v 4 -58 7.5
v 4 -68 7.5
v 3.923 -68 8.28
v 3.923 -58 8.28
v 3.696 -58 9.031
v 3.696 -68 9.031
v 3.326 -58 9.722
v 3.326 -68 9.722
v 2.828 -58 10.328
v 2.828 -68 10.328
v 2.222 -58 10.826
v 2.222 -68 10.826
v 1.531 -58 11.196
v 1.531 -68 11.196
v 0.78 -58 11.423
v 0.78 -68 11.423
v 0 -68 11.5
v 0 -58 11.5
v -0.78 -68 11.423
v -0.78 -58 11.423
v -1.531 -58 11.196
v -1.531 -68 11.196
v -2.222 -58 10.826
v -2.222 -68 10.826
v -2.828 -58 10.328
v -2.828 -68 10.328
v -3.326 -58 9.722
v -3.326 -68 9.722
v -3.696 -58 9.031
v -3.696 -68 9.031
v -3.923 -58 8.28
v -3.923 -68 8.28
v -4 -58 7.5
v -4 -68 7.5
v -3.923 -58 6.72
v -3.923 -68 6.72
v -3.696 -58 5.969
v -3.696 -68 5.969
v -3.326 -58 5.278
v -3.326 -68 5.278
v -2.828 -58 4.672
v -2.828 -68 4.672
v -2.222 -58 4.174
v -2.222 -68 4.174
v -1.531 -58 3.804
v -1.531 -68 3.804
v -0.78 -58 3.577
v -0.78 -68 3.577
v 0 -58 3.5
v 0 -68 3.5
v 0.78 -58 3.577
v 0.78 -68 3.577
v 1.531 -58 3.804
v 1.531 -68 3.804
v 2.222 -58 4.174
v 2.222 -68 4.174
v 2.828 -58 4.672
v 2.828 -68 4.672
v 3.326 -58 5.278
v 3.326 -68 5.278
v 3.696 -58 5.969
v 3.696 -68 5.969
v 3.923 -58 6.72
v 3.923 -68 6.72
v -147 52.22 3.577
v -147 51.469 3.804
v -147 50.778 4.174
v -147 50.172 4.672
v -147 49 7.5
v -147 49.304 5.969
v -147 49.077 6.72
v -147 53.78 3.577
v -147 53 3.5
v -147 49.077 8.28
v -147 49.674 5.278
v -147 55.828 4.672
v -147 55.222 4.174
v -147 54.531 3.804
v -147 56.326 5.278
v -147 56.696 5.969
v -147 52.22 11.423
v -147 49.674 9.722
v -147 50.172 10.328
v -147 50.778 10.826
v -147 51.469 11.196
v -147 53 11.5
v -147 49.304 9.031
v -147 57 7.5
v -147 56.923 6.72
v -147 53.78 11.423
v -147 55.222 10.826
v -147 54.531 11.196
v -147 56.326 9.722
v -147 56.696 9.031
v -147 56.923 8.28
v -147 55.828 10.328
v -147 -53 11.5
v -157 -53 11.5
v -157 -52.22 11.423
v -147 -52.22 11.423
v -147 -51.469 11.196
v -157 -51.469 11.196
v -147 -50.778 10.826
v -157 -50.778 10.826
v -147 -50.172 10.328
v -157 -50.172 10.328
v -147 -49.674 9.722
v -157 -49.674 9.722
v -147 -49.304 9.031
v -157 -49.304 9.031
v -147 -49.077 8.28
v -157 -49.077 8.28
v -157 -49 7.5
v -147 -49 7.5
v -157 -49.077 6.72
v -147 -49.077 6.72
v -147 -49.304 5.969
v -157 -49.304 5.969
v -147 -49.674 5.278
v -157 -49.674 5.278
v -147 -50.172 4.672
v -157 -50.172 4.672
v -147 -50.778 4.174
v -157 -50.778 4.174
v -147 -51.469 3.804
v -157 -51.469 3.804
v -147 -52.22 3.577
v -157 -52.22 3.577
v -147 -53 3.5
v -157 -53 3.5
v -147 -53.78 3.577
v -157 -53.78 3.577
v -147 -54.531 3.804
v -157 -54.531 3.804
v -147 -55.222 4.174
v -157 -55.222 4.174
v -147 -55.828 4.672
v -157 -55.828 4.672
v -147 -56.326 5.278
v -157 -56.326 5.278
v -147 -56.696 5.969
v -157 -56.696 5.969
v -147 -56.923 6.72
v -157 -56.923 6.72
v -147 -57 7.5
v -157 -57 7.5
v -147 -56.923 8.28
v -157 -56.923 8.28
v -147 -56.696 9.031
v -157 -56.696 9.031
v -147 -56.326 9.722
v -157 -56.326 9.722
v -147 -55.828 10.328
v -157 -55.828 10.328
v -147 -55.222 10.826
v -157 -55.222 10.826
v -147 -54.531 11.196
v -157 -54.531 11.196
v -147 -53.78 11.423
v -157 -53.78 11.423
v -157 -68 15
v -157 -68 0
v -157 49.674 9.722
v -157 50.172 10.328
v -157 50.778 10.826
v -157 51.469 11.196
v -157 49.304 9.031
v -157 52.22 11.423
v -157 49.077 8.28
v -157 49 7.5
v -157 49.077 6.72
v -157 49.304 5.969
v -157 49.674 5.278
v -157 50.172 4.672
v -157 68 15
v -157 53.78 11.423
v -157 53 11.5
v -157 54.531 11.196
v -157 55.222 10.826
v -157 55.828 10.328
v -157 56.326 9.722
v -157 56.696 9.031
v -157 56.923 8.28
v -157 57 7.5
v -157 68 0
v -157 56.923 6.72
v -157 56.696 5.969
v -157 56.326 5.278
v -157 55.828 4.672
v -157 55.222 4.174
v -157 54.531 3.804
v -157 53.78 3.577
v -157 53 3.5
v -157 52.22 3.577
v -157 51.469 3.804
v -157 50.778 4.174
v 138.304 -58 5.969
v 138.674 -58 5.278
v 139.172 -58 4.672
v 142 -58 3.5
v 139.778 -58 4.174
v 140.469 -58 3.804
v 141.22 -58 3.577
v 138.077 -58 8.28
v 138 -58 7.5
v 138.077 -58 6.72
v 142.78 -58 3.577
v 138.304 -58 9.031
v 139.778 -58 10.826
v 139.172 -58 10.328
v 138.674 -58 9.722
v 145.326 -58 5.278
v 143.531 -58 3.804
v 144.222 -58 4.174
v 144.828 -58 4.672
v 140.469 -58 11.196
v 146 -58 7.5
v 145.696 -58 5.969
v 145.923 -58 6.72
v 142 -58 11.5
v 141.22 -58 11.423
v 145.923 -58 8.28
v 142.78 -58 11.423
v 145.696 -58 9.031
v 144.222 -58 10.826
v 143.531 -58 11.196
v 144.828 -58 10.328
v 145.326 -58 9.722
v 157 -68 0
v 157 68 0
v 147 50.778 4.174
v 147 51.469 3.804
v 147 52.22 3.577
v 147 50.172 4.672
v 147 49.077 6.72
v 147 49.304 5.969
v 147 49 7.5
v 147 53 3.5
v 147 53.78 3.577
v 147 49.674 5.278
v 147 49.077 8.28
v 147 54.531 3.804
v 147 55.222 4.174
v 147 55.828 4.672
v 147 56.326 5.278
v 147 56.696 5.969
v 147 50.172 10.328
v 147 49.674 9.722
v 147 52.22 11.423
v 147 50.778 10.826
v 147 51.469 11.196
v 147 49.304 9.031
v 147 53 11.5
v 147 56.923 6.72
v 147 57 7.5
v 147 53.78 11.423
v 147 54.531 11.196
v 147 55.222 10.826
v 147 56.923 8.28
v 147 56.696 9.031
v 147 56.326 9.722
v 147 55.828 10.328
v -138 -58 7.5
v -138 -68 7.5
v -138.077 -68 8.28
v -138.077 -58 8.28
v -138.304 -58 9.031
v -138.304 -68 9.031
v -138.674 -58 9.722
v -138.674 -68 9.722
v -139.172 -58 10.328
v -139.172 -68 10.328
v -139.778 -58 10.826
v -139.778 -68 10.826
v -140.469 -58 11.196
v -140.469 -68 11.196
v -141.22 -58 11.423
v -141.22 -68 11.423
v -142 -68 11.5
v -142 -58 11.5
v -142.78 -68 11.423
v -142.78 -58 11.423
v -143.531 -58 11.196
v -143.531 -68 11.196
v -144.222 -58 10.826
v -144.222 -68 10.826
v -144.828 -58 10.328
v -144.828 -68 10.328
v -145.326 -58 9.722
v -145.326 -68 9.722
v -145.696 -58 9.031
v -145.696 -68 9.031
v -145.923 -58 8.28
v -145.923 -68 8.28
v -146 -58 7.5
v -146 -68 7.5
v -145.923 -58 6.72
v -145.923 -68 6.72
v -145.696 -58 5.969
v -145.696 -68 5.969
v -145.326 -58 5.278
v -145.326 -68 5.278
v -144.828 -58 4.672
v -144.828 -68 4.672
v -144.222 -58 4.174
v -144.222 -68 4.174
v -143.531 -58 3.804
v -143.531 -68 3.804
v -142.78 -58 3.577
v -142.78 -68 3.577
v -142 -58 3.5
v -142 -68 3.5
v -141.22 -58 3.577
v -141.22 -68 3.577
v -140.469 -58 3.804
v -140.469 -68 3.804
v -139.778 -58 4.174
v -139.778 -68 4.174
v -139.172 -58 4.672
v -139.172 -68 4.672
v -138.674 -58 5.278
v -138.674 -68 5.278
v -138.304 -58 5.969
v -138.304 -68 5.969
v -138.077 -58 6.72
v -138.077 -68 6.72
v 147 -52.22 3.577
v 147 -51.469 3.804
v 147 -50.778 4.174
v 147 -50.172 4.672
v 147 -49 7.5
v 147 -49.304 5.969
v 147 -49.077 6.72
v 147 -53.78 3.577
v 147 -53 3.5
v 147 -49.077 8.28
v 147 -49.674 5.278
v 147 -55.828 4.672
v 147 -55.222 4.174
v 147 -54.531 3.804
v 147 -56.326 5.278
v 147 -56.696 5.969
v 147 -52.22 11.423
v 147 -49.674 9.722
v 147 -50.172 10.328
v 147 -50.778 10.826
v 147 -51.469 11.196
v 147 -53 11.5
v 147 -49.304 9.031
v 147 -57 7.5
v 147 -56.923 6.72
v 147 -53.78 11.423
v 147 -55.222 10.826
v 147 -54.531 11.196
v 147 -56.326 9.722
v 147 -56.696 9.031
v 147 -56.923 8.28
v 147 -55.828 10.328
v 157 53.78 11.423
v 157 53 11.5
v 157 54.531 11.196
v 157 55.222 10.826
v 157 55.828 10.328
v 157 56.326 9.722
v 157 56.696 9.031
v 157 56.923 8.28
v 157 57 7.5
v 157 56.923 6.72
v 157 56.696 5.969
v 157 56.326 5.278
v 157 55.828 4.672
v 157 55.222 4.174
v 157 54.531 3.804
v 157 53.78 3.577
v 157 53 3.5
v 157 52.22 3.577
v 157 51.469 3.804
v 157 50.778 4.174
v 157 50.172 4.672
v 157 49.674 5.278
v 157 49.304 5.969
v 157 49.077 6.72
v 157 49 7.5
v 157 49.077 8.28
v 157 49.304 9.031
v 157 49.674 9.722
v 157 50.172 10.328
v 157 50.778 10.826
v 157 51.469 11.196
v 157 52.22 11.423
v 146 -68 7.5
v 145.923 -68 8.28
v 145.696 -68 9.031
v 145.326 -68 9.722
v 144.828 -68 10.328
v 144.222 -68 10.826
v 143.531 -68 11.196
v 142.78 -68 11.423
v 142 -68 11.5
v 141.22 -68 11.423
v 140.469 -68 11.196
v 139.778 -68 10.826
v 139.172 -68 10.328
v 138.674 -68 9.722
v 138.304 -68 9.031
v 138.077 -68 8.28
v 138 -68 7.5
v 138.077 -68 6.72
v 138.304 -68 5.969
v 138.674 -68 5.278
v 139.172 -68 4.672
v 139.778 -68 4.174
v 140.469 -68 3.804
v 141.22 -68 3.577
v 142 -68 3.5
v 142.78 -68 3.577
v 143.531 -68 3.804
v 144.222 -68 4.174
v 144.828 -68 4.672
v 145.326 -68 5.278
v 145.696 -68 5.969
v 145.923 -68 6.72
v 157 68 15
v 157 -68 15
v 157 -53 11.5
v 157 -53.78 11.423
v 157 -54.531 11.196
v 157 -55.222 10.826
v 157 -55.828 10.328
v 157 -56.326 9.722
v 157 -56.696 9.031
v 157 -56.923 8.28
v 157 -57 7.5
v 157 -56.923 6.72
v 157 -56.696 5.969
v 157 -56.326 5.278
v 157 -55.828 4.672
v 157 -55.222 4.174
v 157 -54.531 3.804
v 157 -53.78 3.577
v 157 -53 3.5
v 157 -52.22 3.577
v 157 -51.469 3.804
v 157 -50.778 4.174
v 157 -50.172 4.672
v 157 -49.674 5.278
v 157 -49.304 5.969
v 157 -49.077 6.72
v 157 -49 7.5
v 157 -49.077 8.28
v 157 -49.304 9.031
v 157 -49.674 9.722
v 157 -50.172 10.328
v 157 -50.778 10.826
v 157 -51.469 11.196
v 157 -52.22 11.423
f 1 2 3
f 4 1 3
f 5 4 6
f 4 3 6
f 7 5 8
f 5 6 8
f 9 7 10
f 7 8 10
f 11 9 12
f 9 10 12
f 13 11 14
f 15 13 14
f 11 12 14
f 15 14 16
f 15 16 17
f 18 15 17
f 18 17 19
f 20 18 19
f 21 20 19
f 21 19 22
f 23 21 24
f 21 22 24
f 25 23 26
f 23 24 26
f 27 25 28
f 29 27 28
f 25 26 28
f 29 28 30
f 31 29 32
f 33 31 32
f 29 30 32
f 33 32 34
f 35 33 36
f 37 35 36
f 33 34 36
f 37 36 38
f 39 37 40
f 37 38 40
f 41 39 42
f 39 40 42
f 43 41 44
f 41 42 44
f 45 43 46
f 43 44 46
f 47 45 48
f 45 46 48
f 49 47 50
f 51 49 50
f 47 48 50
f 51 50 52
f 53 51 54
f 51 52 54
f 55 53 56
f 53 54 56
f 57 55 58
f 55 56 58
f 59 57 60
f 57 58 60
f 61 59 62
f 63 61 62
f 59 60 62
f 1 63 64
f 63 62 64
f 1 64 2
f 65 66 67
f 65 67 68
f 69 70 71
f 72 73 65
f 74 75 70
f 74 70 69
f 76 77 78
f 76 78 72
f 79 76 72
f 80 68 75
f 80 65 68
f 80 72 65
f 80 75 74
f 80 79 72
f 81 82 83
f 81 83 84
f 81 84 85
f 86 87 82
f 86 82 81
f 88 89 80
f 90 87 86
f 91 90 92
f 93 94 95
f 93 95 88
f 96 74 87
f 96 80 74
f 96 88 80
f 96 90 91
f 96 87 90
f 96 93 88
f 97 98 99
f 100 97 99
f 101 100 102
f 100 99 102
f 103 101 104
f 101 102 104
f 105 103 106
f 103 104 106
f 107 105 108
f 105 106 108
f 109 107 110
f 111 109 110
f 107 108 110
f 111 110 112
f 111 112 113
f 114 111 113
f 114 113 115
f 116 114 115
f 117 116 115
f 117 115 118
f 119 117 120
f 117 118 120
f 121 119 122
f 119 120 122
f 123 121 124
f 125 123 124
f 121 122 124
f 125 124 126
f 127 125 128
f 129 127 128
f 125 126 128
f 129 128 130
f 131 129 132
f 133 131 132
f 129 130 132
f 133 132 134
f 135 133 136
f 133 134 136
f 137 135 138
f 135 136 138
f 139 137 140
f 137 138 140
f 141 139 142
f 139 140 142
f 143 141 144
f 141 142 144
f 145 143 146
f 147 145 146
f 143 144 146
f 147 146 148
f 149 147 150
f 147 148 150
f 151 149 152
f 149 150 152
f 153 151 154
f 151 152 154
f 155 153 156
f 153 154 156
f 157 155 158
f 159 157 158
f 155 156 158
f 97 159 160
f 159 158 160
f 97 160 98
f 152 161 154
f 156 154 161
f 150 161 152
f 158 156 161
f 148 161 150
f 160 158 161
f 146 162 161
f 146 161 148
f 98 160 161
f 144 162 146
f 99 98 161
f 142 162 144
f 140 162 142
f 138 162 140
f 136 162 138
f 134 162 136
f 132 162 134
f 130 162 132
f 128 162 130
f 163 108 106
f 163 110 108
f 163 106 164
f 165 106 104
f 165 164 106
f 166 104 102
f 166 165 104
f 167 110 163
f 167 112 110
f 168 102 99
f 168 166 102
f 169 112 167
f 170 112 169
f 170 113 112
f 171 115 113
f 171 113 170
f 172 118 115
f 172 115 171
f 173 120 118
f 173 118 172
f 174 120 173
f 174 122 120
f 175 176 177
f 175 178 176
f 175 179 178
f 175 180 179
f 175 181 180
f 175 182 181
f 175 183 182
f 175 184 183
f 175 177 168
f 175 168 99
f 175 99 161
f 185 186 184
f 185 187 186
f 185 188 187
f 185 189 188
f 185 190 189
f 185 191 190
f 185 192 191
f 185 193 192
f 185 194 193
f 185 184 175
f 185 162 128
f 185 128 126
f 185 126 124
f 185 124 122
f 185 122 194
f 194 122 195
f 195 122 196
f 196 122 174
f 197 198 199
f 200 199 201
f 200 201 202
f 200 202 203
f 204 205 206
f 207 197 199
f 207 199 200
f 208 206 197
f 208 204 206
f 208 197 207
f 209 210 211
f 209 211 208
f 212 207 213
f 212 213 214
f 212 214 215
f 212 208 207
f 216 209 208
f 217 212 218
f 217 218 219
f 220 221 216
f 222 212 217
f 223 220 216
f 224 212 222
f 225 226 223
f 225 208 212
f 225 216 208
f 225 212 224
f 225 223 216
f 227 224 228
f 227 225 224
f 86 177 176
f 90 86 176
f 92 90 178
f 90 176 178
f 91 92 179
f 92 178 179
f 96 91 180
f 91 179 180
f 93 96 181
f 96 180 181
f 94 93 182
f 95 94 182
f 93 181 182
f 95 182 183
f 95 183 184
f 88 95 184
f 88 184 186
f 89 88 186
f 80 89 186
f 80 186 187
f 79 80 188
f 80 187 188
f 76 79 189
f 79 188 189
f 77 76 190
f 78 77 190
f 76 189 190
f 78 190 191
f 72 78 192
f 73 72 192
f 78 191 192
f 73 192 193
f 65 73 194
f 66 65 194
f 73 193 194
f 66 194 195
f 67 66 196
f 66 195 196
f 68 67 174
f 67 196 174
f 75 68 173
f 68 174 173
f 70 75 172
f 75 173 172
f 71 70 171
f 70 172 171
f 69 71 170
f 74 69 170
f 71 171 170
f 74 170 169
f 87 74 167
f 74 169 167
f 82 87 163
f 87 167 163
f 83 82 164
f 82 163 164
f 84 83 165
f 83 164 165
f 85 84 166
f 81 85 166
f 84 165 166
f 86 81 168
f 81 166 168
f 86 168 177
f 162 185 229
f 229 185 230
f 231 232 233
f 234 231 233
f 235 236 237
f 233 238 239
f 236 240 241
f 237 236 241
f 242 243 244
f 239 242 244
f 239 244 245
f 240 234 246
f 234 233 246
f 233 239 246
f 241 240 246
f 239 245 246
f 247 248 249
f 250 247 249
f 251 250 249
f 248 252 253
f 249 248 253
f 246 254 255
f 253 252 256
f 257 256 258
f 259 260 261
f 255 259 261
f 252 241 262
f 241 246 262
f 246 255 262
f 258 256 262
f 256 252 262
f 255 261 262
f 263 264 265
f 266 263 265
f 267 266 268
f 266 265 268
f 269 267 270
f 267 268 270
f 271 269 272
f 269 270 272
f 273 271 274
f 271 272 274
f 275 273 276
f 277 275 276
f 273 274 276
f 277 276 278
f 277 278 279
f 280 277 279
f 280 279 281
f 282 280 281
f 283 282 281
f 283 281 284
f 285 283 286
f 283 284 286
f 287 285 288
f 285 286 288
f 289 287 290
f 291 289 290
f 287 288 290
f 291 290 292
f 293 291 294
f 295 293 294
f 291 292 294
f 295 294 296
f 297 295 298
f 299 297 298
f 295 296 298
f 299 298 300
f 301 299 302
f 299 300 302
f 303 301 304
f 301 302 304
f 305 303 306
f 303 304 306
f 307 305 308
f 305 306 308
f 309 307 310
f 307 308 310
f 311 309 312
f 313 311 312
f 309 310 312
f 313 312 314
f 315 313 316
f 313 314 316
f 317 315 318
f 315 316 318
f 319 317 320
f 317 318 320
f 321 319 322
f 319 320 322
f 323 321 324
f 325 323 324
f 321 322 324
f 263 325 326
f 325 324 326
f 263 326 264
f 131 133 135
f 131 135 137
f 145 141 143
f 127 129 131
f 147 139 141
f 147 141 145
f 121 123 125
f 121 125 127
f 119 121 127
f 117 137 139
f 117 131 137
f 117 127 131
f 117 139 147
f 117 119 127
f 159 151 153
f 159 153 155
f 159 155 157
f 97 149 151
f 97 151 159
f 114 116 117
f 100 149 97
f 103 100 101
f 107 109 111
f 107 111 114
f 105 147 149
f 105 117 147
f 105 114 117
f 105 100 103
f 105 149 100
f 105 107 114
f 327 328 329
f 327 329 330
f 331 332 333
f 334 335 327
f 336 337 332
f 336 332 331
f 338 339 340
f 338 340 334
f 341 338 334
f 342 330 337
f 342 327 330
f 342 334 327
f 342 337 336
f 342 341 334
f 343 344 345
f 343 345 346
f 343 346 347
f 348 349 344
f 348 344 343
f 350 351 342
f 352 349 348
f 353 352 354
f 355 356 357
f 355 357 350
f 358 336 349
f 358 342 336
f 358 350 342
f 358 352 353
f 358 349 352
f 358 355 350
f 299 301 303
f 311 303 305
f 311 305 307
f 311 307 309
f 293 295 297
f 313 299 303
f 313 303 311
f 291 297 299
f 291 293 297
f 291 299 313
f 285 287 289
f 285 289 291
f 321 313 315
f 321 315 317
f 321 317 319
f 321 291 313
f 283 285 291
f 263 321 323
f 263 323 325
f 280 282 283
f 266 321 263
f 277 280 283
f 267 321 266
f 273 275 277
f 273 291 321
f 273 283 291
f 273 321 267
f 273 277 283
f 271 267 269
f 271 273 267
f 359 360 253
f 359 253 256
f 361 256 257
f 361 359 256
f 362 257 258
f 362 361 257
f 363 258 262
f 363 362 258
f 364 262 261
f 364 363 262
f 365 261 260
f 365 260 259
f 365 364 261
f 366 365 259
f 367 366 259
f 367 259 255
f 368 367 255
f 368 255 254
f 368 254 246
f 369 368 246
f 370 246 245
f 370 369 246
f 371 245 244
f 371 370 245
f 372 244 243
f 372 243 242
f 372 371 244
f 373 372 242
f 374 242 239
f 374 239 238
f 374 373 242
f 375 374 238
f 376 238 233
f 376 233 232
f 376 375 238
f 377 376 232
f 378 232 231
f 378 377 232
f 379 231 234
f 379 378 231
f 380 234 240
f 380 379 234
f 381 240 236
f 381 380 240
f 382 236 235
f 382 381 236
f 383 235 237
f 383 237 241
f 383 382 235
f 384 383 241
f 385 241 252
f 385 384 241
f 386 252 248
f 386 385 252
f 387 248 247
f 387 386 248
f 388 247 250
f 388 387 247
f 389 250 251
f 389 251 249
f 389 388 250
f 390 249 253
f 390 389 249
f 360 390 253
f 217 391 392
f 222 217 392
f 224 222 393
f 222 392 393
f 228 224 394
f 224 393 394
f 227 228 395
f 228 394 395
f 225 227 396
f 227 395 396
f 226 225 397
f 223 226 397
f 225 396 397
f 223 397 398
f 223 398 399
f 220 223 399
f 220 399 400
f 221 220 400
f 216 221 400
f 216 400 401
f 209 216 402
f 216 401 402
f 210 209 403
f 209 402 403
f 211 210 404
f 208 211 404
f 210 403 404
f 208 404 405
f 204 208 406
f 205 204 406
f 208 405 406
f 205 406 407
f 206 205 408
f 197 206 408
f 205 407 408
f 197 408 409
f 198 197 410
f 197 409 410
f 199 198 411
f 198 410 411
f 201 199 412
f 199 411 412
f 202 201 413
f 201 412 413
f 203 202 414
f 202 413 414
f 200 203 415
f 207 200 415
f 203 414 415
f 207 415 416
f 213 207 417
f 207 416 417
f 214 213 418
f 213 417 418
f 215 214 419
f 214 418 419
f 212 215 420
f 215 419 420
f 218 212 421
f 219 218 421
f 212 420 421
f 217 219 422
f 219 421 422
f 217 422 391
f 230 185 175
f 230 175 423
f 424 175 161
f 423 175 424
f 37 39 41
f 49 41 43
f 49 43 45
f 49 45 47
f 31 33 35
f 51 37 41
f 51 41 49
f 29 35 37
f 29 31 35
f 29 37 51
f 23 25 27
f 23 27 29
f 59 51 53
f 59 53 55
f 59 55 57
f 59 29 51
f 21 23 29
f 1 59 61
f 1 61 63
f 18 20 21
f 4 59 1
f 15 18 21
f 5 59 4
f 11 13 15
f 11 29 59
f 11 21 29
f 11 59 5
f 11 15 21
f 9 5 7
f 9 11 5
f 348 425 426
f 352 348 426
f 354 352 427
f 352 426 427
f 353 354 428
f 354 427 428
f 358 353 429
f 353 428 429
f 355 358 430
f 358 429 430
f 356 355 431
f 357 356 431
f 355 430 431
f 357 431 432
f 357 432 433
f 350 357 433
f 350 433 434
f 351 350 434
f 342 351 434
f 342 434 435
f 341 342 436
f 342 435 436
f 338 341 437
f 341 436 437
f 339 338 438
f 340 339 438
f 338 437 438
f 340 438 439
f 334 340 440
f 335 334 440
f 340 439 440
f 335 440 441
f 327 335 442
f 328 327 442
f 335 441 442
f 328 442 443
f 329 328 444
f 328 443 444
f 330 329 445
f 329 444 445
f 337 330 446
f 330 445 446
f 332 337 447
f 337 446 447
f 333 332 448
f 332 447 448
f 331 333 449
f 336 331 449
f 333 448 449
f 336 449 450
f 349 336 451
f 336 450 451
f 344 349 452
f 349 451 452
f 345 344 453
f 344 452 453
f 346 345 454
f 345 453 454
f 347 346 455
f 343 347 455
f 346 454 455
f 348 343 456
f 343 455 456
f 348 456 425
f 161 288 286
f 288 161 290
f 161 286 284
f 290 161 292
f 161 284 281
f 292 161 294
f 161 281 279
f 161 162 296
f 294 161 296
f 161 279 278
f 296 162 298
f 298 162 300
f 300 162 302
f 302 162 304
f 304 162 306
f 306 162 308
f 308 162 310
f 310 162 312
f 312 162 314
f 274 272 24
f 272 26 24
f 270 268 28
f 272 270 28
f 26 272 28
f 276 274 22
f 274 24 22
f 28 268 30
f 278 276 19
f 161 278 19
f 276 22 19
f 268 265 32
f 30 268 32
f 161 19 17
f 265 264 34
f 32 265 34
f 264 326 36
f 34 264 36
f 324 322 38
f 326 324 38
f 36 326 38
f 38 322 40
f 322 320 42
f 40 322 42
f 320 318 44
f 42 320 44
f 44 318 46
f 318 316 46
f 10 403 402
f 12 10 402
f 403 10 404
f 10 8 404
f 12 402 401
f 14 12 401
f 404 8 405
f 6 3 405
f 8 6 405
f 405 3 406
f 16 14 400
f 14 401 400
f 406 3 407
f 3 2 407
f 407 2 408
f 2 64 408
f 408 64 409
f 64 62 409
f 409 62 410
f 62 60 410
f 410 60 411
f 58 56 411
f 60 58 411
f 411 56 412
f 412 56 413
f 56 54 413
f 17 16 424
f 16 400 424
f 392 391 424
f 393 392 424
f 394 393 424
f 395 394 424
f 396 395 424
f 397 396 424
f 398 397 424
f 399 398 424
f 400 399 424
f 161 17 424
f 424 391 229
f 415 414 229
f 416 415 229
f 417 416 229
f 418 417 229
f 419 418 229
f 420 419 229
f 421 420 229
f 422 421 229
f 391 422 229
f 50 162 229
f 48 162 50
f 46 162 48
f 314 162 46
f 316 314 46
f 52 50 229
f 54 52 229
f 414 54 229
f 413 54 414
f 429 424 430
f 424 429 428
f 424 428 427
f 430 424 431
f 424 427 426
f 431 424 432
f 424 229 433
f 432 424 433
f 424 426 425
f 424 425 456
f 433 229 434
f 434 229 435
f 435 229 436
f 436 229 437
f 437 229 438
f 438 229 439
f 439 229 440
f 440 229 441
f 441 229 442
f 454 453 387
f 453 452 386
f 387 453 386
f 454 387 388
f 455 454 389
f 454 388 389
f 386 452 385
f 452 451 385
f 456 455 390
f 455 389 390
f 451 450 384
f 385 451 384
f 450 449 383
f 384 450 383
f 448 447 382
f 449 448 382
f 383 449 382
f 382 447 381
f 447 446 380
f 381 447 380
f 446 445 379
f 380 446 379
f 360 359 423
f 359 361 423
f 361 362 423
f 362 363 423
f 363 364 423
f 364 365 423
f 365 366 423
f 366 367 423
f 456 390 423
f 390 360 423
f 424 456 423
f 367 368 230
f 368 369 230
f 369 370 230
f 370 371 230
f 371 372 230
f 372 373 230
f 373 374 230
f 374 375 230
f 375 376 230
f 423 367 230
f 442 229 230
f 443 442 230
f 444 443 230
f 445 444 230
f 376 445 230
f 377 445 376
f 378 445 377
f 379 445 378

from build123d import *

# Parameters (mm, degrees)
SKETCH1_W               = 314
SKETCH1_H               = 136
BOSS_EXTRUDE1_DEPTH     = 15
SKETCH2_R               = 4
CUT_EXTRUDE1_DEPTH      = 10
LPATTERN2_COUNT         = 2
LPATTERN2_PITCH         = 106
MIRROR1_COPY_1_SKETCH_R = 4
MIRROR1_COPY_1_DEPTH    = 10
SKETCH3_R               = 4
CUT_EXTRUDE2_DEPTH      = 10
LPATTERN1_COUNT         = 3
LPATTERN1_PITCH         = 142


with BuildPart() as part:
    # Sketch1 → Boss-Extrude1 (new body)
    with BuildSketch(Plane.XY):
        Rectangle(SKETCH1_W, SKETCH1_H)
    extrude(amount=BOSS_EXTRUDE1_DEPTH)

    # Sketch2 → Cut-Extrude1 (cut)
    with BuildSketch(Plane.ZY.offset(157)):
        with Locations((7.5, 53)):
            Circle(SKETCH2_R)
    cut_extrude1 = extrude(amount=-CUT_EXTRUDE1_DEPTH, mode=Mode.SUBTRACT)

    # LPattern2: Cut-Extrude1 ×2
    with Locations(*[(0, -i * LPATTERN2_PITCH, 0) for i in range(1, LPATTERN2_COUNT)]):
        add(cut_extrude1, mode=Mode.SUBTRACT)

    # Mirror1: Cut-Extrude1 across plane
    add(cut_extrude1.mirror(Plane(origin=(0, 0, 0), x_dir=(0, 0, 1), z_dir=(1, 0, 0))), mode=Mode.SUBTRACT)

    # Mirror1 copy 1 sketch → Mirror1 copy 1 (cut)
    with BuildSketch(Plane(origin=(157, -106, 0), x_dir=(0, 0, 1), z_dir=(1, 0, 0))):
        with Locations((7.5, -53)):
            Circle(MIRROR1_COPY_1_SKETCH_R)
    extrude(amount=-MIRROR1_COPY_1_DEPTH, mode=Mode.SUBTRACT)

    # Sketch3 → Cut-Extrude2 (cut)
    with BuildSketch(Plane.XZ.offset(68)):
        with Locations((-142, 7.5)):
            Circle(SKETCH3_R)
    cut_extrude2 = extrude(amount=-CUT_EXTRUDE2_DEPTH, mode=Mode.SUBTRACT)

    # LPattern1: Cut-Extrude2 ×3
    with Locations(*[(i * LPATTERN1_PITCH, 0, 0) for i in range(1, LPATTERN1_COUNT)]):
        add(cut_extrude2, mode=Mode.SUBTRACT)


solid = part.part
